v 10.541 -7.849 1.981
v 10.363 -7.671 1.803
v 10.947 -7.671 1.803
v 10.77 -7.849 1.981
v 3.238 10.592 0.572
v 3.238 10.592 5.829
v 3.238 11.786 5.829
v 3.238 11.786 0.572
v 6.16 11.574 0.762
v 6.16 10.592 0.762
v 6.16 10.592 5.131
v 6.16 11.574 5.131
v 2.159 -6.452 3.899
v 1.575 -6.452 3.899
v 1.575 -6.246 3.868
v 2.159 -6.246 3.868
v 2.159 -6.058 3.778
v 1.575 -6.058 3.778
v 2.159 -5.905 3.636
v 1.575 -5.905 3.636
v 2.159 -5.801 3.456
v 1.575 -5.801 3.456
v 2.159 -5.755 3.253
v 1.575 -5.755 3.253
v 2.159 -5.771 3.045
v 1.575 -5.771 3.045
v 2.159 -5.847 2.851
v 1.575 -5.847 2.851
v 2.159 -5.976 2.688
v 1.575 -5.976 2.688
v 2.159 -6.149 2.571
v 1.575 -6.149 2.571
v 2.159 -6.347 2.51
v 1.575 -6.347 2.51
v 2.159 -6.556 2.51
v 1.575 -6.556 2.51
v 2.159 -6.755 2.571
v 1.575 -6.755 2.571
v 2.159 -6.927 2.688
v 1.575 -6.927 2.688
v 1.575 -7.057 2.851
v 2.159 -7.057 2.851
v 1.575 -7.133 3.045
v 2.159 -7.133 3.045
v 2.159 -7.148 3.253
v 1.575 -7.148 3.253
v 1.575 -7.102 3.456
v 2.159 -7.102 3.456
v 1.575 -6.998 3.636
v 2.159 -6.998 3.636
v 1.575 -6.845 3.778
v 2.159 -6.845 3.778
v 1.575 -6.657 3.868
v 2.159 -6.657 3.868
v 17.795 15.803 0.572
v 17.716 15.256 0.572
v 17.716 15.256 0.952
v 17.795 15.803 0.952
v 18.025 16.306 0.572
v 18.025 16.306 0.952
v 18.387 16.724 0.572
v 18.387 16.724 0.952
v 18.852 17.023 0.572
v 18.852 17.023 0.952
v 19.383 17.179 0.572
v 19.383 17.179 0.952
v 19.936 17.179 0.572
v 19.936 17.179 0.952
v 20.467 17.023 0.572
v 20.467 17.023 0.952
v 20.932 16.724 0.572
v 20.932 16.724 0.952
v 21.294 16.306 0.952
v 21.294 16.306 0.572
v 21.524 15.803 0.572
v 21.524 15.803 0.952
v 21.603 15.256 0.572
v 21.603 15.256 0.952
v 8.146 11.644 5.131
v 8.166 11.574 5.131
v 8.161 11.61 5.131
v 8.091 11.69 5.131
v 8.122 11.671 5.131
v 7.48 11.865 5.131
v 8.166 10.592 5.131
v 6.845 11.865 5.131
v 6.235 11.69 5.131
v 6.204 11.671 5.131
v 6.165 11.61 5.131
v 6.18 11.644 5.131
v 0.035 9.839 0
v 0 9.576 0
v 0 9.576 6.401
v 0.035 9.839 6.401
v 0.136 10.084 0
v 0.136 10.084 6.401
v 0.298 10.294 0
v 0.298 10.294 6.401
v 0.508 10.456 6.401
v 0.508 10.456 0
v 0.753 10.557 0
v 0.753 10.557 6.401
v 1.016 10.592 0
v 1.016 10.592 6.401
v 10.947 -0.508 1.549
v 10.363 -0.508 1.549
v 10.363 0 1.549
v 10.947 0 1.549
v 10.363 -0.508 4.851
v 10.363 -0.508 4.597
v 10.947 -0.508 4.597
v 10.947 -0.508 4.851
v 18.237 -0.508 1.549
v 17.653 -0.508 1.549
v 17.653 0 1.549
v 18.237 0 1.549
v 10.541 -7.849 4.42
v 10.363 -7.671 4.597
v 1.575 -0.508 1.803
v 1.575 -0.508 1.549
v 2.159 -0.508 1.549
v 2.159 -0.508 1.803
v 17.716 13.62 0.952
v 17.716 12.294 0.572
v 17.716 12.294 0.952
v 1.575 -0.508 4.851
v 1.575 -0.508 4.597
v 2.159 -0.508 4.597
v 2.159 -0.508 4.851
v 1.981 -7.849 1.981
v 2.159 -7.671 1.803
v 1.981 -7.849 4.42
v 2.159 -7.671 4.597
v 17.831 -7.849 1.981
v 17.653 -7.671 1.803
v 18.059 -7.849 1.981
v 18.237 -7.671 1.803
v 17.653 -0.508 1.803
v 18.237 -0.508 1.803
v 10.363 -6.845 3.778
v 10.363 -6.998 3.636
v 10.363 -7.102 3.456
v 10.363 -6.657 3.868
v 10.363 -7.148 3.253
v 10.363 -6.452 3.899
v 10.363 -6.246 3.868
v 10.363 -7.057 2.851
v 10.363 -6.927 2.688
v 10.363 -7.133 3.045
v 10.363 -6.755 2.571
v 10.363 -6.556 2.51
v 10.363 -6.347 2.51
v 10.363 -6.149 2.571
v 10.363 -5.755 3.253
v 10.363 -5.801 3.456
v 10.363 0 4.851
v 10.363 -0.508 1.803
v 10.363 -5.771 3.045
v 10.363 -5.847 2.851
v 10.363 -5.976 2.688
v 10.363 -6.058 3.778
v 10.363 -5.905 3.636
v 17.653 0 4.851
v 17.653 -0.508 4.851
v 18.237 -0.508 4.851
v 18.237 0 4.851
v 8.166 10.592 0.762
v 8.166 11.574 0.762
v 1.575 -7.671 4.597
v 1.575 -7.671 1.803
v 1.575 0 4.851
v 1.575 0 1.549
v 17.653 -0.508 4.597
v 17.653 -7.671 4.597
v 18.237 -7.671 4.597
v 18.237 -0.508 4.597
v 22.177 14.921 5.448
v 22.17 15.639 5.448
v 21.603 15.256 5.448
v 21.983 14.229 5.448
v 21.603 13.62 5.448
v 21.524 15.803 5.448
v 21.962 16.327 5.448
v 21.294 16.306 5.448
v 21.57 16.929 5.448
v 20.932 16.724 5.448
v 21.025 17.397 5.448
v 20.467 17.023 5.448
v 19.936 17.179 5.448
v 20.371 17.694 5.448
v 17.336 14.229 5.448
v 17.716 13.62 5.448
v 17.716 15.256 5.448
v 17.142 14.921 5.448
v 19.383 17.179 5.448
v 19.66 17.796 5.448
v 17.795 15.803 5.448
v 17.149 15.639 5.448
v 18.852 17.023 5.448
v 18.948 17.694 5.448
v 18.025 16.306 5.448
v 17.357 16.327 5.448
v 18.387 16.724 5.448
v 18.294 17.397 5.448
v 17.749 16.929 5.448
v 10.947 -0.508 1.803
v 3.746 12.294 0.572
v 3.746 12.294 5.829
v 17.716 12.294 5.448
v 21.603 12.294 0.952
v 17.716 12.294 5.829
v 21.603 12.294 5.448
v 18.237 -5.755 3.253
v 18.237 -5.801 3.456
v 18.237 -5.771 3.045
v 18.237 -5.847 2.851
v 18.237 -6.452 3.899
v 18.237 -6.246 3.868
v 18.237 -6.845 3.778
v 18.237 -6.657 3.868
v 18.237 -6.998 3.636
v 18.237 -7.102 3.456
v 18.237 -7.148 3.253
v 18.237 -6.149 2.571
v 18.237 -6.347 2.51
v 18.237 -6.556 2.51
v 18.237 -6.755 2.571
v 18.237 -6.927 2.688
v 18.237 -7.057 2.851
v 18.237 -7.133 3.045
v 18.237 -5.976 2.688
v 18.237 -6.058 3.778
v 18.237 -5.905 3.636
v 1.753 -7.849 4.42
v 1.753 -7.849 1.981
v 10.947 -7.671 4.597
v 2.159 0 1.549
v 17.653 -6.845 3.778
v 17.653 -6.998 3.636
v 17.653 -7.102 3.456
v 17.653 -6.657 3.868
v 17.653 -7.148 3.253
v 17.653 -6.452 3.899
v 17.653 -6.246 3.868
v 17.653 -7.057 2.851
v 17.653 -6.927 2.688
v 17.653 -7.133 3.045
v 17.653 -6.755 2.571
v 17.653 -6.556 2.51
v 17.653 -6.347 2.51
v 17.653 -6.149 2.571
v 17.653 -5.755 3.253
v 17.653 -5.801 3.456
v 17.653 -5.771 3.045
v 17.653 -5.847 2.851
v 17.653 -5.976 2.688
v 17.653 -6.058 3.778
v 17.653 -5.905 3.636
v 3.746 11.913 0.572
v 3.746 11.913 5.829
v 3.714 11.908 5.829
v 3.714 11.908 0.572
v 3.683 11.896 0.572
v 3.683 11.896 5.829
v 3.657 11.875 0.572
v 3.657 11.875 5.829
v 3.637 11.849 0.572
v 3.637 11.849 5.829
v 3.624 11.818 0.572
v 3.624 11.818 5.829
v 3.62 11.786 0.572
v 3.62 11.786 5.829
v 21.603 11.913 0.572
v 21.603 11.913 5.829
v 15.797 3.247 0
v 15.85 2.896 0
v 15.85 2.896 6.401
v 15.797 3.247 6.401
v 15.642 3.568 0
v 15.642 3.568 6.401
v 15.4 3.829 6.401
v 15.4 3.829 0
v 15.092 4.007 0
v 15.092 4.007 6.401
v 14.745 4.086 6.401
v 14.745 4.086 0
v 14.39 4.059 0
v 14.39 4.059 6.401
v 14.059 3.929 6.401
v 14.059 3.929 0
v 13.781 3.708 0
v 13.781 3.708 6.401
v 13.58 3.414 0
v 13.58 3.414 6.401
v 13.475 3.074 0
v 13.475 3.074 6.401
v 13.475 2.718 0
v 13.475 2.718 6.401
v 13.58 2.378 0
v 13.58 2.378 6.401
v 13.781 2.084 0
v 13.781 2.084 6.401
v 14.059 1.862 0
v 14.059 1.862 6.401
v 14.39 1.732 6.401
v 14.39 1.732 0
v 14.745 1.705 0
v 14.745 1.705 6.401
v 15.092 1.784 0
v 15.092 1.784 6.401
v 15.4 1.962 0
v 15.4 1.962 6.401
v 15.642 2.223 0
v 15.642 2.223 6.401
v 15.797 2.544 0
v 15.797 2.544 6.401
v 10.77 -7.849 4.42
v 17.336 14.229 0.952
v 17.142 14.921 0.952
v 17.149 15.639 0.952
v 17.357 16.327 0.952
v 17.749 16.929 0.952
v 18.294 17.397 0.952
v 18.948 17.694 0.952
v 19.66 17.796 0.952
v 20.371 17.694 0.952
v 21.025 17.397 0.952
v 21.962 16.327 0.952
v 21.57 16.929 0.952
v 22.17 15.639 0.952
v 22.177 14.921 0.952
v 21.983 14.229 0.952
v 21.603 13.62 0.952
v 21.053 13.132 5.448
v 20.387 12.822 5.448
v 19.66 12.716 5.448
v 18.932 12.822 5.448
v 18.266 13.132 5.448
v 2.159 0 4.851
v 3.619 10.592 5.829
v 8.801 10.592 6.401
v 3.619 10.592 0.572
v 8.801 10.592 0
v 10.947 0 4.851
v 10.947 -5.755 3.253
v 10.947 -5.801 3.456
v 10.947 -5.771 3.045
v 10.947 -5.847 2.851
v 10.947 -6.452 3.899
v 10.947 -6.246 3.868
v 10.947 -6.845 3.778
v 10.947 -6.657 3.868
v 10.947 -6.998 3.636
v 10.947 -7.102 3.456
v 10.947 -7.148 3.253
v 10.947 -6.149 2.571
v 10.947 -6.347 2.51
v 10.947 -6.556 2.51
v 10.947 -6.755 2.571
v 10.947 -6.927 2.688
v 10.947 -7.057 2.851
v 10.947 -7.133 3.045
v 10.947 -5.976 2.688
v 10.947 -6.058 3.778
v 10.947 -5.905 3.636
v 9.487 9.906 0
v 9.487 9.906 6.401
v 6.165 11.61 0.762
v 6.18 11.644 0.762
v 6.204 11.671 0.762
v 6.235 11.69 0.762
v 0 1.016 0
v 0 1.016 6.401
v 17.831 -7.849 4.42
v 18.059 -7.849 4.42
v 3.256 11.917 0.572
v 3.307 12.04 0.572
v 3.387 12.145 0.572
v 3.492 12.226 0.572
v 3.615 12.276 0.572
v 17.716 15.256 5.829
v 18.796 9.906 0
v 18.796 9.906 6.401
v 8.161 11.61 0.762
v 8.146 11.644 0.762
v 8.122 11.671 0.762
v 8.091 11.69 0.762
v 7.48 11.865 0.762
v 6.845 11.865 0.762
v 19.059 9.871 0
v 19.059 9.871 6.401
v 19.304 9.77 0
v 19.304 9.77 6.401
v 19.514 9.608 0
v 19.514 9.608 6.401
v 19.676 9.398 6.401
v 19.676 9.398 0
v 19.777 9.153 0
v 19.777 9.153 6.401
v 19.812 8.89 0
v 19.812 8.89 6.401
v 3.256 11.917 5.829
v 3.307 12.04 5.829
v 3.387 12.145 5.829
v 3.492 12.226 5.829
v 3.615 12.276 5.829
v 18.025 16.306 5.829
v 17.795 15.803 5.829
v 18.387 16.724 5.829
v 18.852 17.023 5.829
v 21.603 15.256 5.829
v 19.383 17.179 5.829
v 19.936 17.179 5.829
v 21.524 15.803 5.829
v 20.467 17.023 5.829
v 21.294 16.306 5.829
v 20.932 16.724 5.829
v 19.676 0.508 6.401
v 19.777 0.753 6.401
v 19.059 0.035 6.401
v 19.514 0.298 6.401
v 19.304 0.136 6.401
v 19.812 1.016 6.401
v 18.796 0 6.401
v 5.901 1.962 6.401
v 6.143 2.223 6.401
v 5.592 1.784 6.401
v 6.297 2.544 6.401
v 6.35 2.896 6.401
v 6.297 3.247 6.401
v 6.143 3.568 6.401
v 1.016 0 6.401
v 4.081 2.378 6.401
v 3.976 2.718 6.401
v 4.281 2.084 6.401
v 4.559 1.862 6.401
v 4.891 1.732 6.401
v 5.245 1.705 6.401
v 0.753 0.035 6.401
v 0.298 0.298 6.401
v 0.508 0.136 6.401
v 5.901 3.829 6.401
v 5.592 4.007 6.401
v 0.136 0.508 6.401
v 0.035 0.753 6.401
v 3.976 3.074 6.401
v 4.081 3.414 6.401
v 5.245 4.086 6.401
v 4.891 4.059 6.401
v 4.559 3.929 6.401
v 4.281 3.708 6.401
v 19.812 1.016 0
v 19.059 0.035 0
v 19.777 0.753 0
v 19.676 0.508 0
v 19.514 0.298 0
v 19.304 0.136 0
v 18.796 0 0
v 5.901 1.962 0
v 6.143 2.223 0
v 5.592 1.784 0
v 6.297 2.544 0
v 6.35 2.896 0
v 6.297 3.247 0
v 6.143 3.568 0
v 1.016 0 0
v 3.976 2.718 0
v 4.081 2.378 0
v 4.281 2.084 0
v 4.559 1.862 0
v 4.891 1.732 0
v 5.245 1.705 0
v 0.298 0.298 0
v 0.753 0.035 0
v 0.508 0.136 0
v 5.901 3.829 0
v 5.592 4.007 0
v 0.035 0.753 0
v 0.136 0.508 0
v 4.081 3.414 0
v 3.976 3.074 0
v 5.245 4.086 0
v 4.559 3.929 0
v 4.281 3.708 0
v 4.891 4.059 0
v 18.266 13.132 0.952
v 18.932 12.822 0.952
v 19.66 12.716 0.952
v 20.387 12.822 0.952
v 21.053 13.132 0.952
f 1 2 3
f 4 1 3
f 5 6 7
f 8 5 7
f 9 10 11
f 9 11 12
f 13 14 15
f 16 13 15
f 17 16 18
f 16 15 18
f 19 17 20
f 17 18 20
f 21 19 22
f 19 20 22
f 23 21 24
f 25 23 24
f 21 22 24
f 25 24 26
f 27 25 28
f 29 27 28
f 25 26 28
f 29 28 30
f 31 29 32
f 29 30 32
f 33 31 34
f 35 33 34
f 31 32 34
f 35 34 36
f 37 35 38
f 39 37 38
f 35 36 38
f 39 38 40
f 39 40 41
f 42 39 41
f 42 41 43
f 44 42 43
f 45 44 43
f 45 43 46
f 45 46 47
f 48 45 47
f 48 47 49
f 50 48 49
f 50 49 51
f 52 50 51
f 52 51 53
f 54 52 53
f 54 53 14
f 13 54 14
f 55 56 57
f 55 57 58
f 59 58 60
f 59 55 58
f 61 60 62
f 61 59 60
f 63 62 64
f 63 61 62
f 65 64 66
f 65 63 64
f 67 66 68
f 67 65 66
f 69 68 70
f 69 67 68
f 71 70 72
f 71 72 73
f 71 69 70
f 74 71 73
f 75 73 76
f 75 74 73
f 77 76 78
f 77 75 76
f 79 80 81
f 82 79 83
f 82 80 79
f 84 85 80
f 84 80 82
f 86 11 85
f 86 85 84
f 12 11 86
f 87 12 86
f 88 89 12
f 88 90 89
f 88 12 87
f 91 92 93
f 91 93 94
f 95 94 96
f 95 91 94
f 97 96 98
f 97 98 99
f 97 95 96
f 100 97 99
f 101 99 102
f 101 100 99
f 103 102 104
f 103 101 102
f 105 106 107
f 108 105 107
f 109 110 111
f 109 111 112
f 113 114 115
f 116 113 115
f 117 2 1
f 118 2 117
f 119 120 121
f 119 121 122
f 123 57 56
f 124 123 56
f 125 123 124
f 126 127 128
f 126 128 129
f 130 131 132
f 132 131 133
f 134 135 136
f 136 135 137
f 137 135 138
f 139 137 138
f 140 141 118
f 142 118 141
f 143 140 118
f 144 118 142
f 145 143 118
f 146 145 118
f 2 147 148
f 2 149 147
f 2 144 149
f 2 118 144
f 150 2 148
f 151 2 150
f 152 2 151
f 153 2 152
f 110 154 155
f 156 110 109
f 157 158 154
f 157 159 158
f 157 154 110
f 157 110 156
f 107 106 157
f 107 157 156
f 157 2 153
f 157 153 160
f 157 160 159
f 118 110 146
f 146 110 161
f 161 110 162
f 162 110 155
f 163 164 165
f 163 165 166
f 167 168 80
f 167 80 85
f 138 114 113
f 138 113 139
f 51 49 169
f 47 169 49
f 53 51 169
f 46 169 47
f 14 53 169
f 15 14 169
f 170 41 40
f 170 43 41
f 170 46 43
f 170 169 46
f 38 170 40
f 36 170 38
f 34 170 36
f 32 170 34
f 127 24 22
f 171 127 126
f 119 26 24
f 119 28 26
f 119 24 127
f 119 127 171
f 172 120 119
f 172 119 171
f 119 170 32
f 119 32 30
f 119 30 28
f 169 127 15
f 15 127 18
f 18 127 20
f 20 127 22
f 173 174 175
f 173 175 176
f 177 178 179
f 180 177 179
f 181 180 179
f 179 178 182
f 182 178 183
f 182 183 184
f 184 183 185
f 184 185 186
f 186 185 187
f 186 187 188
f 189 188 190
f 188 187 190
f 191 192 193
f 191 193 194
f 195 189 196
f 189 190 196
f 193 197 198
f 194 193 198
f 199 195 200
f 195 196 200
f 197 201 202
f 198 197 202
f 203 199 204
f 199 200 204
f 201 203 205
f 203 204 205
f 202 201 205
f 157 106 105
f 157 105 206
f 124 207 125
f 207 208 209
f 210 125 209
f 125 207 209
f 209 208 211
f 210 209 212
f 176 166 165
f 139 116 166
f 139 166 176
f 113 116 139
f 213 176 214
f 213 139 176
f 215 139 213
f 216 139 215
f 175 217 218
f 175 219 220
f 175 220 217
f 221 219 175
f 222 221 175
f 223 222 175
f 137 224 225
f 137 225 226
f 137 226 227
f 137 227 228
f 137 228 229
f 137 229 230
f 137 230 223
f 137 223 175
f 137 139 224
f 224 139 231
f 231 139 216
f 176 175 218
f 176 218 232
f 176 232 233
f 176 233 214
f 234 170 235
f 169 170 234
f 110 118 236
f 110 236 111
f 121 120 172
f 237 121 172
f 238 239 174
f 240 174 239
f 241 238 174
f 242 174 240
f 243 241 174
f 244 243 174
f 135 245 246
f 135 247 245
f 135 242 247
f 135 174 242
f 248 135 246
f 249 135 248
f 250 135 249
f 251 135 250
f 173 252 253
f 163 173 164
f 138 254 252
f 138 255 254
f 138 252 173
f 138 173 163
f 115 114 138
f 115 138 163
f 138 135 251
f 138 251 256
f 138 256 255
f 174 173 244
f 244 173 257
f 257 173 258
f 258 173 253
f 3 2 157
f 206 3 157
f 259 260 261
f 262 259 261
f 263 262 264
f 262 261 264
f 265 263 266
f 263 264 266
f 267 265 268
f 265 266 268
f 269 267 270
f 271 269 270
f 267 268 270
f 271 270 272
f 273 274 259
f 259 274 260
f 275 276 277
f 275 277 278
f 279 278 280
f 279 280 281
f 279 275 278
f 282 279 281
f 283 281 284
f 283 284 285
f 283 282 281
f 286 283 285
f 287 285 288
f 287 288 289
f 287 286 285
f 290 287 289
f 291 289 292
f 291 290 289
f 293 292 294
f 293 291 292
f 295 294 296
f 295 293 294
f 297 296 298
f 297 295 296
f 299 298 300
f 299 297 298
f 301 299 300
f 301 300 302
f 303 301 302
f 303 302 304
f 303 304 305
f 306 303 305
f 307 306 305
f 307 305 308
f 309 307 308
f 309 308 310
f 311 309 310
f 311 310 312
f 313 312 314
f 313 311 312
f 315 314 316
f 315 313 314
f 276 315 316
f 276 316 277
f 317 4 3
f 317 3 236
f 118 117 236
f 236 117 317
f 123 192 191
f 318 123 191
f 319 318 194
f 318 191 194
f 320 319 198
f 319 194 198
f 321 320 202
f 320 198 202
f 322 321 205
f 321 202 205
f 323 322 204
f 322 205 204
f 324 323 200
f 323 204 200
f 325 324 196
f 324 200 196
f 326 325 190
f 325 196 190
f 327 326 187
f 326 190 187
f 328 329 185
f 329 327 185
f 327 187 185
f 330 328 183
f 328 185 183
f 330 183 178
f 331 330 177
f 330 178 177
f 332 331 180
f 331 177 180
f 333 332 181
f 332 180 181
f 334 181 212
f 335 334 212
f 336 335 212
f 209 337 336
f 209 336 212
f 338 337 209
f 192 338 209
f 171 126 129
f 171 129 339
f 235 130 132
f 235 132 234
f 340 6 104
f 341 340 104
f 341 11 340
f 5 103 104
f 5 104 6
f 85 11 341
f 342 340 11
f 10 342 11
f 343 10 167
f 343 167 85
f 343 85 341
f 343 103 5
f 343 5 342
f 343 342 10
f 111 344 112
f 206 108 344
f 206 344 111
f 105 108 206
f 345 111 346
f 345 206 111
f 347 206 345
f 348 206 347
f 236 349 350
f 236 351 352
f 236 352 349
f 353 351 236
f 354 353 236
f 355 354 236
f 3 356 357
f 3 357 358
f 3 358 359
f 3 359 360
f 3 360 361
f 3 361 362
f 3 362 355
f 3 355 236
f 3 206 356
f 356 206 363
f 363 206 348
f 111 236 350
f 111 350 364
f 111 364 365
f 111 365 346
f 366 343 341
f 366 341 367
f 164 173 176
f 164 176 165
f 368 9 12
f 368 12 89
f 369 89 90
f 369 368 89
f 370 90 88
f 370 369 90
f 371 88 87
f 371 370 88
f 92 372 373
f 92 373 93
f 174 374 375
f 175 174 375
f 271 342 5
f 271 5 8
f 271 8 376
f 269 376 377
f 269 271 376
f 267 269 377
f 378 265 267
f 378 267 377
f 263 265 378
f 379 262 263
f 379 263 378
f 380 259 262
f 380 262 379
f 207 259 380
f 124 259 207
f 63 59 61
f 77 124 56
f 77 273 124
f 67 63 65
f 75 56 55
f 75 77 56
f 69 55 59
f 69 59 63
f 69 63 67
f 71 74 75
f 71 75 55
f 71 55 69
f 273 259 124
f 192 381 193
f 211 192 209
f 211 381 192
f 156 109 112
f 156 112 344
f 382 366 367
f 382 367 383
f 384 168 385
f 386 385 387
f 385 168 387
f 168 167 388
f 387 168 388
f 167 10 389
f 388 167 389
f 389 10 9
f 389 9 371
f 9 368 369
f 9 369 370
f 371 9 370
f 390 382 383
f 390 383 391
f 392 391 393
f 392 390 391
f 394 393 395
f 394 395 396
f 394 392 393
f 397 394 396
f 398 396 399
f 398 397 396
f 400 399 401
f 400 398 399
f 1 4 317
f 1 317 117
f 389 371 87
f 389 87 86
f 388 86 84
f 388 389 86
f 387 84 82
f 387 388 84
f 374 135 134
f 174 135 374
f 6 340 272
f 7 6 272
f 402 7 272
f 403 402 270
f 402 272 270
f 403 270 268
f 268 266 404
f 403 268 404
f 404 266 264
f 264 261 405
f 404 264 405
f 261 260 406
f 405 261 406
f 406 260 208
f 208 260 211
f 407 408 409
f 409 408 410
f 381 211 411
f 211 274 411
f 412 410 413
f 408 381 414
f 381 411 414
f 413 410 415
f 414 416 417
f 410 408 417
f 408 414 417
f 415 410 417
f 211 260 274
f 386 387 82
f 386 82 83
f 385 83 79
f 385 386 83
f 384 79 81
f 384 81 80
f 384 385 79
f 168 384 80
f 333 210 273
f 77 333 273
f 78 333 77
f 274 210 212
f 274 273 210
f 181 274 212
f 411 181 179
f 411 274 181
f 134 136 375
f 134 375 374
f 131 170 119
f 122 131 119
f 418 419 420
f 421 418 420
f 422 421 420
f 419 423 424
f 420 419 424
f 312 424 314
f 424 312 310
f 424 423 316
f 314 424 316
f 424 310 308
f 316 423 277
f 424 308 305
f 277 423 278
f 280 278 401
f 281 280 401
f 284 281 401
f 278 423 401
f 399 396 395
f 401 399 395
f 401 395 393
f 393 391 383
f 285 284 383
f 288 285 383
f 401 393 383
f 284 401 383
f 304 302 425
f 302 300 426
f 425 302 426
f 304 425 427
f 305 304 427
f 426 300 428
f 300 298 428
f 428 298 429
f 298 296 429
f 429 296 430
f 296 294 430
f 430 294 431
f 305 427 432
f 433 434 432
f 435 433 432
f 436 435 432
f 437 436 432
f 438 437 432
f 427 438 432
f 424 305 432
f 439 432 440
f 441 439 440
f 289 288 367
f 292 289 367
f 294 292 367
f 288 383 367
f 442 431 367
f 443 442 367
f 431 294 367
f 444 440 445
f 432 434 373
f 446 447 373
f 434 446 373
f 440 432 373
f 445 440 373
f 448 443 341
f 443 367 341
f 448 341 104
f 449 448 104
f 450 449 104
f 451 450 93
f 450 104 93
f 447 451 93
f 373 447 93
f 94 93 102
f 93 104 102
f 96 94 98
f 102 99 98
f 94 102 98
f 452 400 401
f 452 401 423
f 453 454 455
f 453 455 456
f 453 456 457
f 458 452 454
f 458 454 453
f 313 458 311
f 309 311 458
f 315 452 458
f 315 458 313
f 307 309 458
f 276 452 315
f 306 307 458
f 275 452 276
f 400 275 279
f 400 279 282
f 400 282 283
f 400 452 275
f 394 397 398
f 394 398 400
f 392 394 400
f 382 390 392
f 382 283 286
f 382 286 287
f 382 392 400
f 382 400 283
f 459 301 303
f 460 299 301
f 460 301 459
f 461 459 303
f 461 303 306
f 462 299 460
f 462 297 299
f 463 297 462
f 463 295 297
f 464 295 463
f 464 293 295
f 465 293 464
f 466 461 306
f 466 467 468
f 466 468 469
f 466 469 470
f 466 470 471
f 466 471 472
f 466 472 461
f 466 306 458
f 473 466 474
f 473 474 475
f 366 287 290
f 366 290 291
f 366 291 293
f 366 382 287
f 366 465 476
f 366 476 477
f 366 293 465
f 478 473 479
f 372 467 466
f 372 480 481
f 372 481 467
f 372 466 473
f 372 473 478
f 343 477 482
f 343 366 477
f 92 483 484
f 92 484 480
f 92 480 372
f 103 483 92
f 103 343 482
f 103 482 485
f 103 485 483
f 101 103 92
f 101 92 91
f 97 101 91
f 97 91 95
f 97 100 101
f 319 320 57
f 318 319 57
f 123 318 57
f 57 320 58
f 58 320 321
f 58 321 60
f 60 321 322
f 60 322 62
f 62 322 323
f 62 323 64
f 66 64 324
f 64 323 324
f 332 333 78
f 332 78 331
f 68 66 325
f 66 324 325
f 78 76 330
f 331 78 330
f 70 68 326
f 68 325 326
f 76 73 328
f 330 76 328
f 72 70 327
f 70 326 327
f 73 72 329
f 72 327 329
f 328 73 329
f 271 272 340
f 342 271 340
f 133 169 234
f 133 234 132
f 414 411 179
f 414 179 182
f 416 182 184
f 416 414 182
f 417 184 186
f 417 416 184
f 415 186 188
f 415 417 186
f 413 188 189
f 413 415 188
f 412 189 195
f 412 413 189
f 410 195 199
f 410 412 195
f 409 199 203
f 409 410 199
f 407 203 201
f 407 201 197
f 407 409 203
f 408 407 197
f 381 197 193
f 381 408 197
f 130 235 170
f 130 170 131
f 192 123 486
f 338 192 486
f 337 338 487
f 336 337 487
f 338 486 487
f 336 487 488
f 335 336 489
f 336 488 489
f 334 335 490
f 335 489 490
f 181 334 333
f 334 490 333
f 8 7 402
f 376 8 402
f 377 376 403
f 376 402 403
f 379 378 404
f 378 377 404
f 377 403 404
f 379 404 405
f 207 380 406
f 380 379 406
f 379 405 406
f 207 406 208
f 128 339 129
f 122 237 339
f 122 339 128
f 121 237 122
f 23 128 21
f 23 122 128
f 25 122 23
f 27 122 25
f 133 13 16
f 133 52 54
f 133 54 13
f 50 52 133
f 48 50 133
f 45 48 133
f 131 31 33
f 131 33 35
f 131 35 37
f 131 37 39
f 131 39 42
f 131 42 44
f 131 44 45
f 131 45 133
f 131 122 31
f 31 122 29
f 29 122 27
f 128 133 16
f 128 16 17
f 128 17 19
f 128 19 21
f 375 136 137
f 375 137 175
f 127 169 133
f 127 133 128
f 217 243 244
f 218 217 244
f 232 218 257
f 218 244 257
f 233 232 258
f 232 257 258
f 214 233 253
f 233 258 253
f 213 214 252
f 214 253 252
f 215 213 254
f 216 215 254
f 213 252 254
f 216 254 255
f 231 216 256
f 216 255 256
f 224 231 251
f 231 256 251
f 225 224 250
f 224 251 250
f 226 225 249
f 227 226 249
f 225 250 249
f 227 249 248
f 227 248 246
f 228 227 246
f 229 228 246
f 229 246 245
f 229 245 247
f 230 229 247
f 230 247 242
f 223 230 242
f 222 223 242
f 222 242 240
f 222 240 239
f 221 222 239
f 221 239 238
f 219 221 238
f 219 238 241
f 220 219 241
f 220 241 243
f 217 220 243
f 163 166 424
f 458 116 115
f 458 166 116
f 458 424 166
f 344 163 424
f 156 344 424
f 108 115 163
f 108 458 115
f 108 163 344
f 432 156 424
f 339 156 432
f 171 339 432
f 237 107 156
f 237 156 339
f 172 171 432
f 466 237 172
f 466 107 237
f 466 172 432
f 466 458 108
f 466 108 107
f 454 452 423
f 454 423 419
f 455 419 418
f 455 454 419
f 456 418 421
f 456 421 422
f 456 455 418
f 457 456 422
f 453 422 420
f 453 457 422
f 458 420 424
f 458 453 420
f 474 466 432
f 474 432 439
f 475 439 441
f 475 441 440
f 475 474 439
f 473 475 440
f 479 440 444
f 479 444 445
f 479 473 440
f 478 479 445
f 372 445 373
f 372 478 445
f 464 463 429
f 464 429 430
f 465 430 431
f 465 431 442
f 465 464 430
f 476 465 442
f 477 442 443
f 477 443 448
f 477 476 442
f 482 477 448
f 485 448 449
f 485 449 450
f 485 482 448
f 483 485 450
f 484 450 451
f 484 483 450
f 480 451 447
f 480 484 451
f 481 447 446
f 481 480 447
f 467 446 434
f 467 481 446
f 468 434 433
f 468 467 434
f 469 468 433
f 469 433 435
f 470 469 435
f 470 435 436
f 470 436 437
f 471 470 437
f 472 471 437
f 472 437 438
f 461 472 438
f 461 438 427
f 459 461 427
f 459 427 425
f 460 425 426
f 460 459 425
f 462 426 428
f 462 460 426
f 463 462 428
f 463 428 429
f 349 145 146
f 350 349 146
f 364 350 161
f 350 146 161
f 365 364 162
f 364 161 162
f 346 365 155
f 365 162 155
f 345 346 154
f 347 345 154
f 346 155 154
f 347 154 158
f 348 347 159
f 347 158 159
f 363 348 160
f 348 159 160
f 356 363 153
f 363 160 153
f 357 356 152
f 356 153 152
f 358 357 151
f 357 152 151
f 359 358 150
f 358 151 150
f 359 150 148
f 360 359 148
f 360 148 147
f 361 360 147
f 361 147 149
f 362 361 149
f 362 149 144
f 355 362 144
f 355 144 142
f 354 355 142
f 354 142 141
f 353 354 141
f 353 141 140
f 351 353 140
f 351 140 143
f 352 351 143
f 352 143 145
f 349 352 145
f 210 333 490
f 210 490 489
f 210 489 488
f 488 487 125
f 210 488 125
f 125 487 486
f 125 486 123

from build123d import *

# Parameters (mm, degrees)
SKETCH1_R               = 1.1938
BOSS_EXTRUDE1_DEPTH     = 6.4008
SKETCH2_W               = 1.8034
SKETCH2_H               = 7.3406
SKETCH2_W_2             = 1.27
SKETCH2_H_2             = 1.2954
SKETCH2_R               = 0.6985
SKETCH2_W_3             = 1.5494
SKETCH2_H_3             = 0.508
SKETCH2_W_4             = 0.762
CUT_EXTRUDE1_DEPTH      = 20.812
CHAMFER1_SIZE           = 0.1778
BOSS_EXTRUDE3_DEPTH     = 6.4008
SKETCH4_W               = 0.5715
SKETCH4_H               = 7.2038
CUT_EXTRUDE2_DEPTH      = 3.3876
CUT_EXTRUDE2_DEPTH_BACK = 20.812
CUT_EXTRUDE3_DEPTH      = 0.381
CUT_EXTRUDE4_DEPTH      = 0.381
CUT_EXTRUDE5_START      = -0.381
CUT_EXTRUDE5_DEPTH      = 4.4958


with BuildPart() as part:
    # Sketch1 → Boss-Extrude1 (new body)
    with BuildSketch(Plane.XY):
        with BuildLine():
            Line((8.8011, 10.5918), (9.4869, 9.906))
            Line((9.4869, 9.906), (18.796, 9.906))
            ThreePointArc((18.796, 9.906), (19.51442049, 9.60842049), (19.812, 8.89))
            Line((19.812, 8.89), (19.812, 1.016))
            ThreePointArc((19.812, 1.016), (19.51442049, 0.29757951), (18.796, 0))
            Line((18.796, 0), (18.2372, 0))
            Line((18.2372, 0), (18.2372, -7.8486))
            Line((18.2372, -7.8486), (17.653, -7.8486))
            Line((17.653, -7.8486), (17.653, 0))
            Line((17.653, 0), (10.9474, 0))
            Line((10.9474, 0), (10.9474, -7.8486))
            Line((10.9474, -7.8486), (10.3632, -7.8486))
            Line((10.3632, -7.8486), (10.3632, 0))
            Line((10.3632, 0), (2.159, 0))
            Line((2.159, 0), (2.159, -7.8486))
            Line((2.159, -7.8486), (1.5748, -7.8486))
            Line((1.5748, -7.8486), (1.5748, 0))
            Line((1.5748, 0), (1.016, 0))
            ThreePointArc((1.016, 0), (0.29757951, 0.29757951), (0, 1.016))
            Line((0, 1.016), (0, 9.5758))
            ThreePointArc((0, 9.5758), (0.29757951, 10.29422049), (1.016, 10.5918))
            Line((1.016, 10.5918), (6.1595, 10.5918))
            Line((6.1595, 10.5918), (6.1595, 11.574364795))
            ThreePointArc((6.1595, 11.574364795), (6.180021184, 11.643583736), (6.234952941, 11.690433313))
            ThreePointArc((6.234952941, 11.690433313), (7.1628, 11.8872), (8.090647059, 11.690433313))
            ThreePointArc((8.090647059, 11.690433313), (8.145578816, 11.643583736), (8.1661, 11.574364795))
            Line((8.1661, 11.574364795), (8.1661, 10.5918))
            Line((8.1661, 10.5918), (8.8011, 10.5918))
        make_face()
        with Locations((5.1562, 2.8956)):
            Circle(SKETCH1_R, mode=Mode.SUBTRACT)
        with Locations((14.6558, 2.8956)):
            Circle(SKETCH1_R, mode=Mode.SUBTRACT)
    extrude(amount=BOSS_EXTRUDE1_DEPTH)

    # Sketch2 → Cut-Extrude1 (cut, through all)
    with BuildSketch(Plane.ZY):
        with Locations((0.9017, -4.1783)):
            Rectangle(SKETCH2_W, SKETCH2_H)
        with Locations((5.4991, -4.1783)):
            Rectangle(SKETCH2_W, SKETCH2_H)
        with Locations((5.7658, 11.2395)):
            Rectangle(SKETCH2_W_2, SKETCH2_H_2)
        with Locations((3.2004, -6.4516)):
            Circle(SKETCH2_R)
        with Locations((5.6261, -0.254)):
            Rectangle(SKETCH2_W_3, SKETCH2_H_3)
        with Locations((0.7747, -0.254)):
            Rectangle(SKETCH2_W_3, SKETCH2_H_3)
        with Locations((0.381, 11.2395)):
            Rectangle(SKETCH2_W_4, SKETCH2_H_2)
    extrude(amount=-CUT_EXTRUDE1_DEPTH, mode=Mode.SUBTRACT)

    # Chamfer1
    chamfer1_edges = [part.edges().sort_by_distance(p)[0] for p in [
        (1.8669, -7.8486, 1.8034),
        (10.6553, -7.8486, 1.8034),
        (17.9451, -7.8486, 1.8034),
        (18.2372, -7.8486, 3.2004),
        (17.653, -7.8486, 3.2004),
        (10.9474, -7.8486, 3.2004),
        (10.3632, -7.8486, 3.2004),
        (2.159, -7.8486, 3.2004),
        (1.5748, -7.8486, 3.2004),
        (1.8669, -7.8486, 4.5974),
        (10.6553, -7.8486, 4.5974),
        (17.9451, -7.8486, 4.5974),
    ]]
    chamfer(chamfer1_edges, length=CHAMFER1_SIZE)

    # Sketch3 → Boss-Extrude3 (add, through all)
    with BuildSketch(Plane.XY.offset(6.4008)):
        with BuildLine():
            Line((3.2385, 10.5918), (3.2385, 11.7856))
            ThreePointArc((3.2385, 11.7856), (3.387289755, 12.144810245), (3.7465, 12.2936))
            Line((3.7465, 12.2936), (17.7165, 12.2936))
            Line((17.7165, 12.2936), (17.7165, 13.619763092))
            ThreePointArc((17.7165, 13.619763092), (19.6596, 17.7956), (21.6027, 13.619763092))
            Line((21.6027, 13.619763092), (21.6027, 12.2936))
            Line((21.6027, 12.2936), (21.6027, 11.9126))
            Line((21.6027, 11.9126), (3.7465, 11.9126))
            ThreePointArc((3.7465, 11.9126), (3.656697439, 11.875402561), (3.6195, 11.7856))
            Line((3.6195, 11.7856), (3.6195, 10.5918))
            Line((3.6195, 10.5918), (3.2385, 10.5918))
        make_face()
    extrude(amount=-BOSS_EXTRUDE3_DEPTH)

    # Sketch4 → Cut-Extrude2 (cut, two sides)
    with BuildSketch(Plane(origin=(19.812, 0, 0), x_dir=(0, 0, -1), z_dir=(1, 0, 0))) as cut_extrude2_sk:
        with Locations((-0.28575, 14.1937)):
            Rectangle(SKETCH4_W, SKETCH4_H)
        with Locations((-6.11505, 14.1937)):
            Rectangle(SKETCH4_W, SKETCH4_H)
    extrude(amount=CUT_EXTRUDE2_DEPTH, mode=Mode.SUBTRACT)
    extrude(cut_extrude2_sk.sketch, amount=-CUT_EXTRUDE2_DEPTH_BACK, mode=Mode.SUBTRACT)

    # Sketch5 → Cut-Extrude3 (cut)
    with BuildSketch(Plane.XY.offset(5.8293)):
        with BuildLine():
            Line((21.6027, 13.619763092), (21.6027, 15.2556))
            ThreePointArc((21.6027, 15.2556), (19.6596, 17.1987), (17.7165, 15.2556))
            Line((17.7165, 15.2556), (17.7165, 13.619763092))
            ThreePointArc((17.7165, 13.619763092), (19.6596, 17.7956), (21.6027, 13.619763092))
        make_face()
    extrude(amount=-CUT_EXTRUDE3_DEPTH, mode=Mode.SUBTRACT)

    # Sketch6 → Cut-Extrude4 (cut)
    with BuildSketch(Plane(origin=(0, 0, 0.5715), x_dir=(-1, 0, 0), z_dir=(0, 0, -1))):
        with BuildLine():
            Line((-21.6027, 15.2556), (-21.6027, 13.619763092))
            ThreePointArc((-21.6027, 13.619763092), (-19.6596, 17.7956), (-17.7165, 13.619763092))
            Line((-17.7165, 13.619763092), (-17.7165, 15.2556))
            ThreePointArc((-17.7165, 15.2556), (-19.6596, 17.1987), (-21.6027, 15.2556))
        make_face()
    extrude(amount=-CUT_EXTRUDE4_DEPTH, mode=Mode.SUBTRACT)

    # Sketch7 → Cut-Extrude5 (cut)
    with BuildSketch(Plane(origin=(0, 0, 0.5715), x_dir=(-1, 0, 0), z_dir=(0, 0, -1)).offset(CUT_EXTRUDE5_START)):
        with BuildLine():
            Line((-21.6027, 13.619763092), (-21.6027, 12.2936))
            Line((-21.6027, 12.2936), (-17.7165, 12.2936))
            Line((-17.7165, 12.2936), (-17.7165, 13.619763092))
            ThreePointArc((-17.7165, 13.619763092), (-19.6596, 12.7156), (-21.6027, 13.619763092))
        make_face()
    extrude(amount=-CUT_EXTRUDE5_DEPTH, mode=Mode.SUBTRACT)


solid = part.part
